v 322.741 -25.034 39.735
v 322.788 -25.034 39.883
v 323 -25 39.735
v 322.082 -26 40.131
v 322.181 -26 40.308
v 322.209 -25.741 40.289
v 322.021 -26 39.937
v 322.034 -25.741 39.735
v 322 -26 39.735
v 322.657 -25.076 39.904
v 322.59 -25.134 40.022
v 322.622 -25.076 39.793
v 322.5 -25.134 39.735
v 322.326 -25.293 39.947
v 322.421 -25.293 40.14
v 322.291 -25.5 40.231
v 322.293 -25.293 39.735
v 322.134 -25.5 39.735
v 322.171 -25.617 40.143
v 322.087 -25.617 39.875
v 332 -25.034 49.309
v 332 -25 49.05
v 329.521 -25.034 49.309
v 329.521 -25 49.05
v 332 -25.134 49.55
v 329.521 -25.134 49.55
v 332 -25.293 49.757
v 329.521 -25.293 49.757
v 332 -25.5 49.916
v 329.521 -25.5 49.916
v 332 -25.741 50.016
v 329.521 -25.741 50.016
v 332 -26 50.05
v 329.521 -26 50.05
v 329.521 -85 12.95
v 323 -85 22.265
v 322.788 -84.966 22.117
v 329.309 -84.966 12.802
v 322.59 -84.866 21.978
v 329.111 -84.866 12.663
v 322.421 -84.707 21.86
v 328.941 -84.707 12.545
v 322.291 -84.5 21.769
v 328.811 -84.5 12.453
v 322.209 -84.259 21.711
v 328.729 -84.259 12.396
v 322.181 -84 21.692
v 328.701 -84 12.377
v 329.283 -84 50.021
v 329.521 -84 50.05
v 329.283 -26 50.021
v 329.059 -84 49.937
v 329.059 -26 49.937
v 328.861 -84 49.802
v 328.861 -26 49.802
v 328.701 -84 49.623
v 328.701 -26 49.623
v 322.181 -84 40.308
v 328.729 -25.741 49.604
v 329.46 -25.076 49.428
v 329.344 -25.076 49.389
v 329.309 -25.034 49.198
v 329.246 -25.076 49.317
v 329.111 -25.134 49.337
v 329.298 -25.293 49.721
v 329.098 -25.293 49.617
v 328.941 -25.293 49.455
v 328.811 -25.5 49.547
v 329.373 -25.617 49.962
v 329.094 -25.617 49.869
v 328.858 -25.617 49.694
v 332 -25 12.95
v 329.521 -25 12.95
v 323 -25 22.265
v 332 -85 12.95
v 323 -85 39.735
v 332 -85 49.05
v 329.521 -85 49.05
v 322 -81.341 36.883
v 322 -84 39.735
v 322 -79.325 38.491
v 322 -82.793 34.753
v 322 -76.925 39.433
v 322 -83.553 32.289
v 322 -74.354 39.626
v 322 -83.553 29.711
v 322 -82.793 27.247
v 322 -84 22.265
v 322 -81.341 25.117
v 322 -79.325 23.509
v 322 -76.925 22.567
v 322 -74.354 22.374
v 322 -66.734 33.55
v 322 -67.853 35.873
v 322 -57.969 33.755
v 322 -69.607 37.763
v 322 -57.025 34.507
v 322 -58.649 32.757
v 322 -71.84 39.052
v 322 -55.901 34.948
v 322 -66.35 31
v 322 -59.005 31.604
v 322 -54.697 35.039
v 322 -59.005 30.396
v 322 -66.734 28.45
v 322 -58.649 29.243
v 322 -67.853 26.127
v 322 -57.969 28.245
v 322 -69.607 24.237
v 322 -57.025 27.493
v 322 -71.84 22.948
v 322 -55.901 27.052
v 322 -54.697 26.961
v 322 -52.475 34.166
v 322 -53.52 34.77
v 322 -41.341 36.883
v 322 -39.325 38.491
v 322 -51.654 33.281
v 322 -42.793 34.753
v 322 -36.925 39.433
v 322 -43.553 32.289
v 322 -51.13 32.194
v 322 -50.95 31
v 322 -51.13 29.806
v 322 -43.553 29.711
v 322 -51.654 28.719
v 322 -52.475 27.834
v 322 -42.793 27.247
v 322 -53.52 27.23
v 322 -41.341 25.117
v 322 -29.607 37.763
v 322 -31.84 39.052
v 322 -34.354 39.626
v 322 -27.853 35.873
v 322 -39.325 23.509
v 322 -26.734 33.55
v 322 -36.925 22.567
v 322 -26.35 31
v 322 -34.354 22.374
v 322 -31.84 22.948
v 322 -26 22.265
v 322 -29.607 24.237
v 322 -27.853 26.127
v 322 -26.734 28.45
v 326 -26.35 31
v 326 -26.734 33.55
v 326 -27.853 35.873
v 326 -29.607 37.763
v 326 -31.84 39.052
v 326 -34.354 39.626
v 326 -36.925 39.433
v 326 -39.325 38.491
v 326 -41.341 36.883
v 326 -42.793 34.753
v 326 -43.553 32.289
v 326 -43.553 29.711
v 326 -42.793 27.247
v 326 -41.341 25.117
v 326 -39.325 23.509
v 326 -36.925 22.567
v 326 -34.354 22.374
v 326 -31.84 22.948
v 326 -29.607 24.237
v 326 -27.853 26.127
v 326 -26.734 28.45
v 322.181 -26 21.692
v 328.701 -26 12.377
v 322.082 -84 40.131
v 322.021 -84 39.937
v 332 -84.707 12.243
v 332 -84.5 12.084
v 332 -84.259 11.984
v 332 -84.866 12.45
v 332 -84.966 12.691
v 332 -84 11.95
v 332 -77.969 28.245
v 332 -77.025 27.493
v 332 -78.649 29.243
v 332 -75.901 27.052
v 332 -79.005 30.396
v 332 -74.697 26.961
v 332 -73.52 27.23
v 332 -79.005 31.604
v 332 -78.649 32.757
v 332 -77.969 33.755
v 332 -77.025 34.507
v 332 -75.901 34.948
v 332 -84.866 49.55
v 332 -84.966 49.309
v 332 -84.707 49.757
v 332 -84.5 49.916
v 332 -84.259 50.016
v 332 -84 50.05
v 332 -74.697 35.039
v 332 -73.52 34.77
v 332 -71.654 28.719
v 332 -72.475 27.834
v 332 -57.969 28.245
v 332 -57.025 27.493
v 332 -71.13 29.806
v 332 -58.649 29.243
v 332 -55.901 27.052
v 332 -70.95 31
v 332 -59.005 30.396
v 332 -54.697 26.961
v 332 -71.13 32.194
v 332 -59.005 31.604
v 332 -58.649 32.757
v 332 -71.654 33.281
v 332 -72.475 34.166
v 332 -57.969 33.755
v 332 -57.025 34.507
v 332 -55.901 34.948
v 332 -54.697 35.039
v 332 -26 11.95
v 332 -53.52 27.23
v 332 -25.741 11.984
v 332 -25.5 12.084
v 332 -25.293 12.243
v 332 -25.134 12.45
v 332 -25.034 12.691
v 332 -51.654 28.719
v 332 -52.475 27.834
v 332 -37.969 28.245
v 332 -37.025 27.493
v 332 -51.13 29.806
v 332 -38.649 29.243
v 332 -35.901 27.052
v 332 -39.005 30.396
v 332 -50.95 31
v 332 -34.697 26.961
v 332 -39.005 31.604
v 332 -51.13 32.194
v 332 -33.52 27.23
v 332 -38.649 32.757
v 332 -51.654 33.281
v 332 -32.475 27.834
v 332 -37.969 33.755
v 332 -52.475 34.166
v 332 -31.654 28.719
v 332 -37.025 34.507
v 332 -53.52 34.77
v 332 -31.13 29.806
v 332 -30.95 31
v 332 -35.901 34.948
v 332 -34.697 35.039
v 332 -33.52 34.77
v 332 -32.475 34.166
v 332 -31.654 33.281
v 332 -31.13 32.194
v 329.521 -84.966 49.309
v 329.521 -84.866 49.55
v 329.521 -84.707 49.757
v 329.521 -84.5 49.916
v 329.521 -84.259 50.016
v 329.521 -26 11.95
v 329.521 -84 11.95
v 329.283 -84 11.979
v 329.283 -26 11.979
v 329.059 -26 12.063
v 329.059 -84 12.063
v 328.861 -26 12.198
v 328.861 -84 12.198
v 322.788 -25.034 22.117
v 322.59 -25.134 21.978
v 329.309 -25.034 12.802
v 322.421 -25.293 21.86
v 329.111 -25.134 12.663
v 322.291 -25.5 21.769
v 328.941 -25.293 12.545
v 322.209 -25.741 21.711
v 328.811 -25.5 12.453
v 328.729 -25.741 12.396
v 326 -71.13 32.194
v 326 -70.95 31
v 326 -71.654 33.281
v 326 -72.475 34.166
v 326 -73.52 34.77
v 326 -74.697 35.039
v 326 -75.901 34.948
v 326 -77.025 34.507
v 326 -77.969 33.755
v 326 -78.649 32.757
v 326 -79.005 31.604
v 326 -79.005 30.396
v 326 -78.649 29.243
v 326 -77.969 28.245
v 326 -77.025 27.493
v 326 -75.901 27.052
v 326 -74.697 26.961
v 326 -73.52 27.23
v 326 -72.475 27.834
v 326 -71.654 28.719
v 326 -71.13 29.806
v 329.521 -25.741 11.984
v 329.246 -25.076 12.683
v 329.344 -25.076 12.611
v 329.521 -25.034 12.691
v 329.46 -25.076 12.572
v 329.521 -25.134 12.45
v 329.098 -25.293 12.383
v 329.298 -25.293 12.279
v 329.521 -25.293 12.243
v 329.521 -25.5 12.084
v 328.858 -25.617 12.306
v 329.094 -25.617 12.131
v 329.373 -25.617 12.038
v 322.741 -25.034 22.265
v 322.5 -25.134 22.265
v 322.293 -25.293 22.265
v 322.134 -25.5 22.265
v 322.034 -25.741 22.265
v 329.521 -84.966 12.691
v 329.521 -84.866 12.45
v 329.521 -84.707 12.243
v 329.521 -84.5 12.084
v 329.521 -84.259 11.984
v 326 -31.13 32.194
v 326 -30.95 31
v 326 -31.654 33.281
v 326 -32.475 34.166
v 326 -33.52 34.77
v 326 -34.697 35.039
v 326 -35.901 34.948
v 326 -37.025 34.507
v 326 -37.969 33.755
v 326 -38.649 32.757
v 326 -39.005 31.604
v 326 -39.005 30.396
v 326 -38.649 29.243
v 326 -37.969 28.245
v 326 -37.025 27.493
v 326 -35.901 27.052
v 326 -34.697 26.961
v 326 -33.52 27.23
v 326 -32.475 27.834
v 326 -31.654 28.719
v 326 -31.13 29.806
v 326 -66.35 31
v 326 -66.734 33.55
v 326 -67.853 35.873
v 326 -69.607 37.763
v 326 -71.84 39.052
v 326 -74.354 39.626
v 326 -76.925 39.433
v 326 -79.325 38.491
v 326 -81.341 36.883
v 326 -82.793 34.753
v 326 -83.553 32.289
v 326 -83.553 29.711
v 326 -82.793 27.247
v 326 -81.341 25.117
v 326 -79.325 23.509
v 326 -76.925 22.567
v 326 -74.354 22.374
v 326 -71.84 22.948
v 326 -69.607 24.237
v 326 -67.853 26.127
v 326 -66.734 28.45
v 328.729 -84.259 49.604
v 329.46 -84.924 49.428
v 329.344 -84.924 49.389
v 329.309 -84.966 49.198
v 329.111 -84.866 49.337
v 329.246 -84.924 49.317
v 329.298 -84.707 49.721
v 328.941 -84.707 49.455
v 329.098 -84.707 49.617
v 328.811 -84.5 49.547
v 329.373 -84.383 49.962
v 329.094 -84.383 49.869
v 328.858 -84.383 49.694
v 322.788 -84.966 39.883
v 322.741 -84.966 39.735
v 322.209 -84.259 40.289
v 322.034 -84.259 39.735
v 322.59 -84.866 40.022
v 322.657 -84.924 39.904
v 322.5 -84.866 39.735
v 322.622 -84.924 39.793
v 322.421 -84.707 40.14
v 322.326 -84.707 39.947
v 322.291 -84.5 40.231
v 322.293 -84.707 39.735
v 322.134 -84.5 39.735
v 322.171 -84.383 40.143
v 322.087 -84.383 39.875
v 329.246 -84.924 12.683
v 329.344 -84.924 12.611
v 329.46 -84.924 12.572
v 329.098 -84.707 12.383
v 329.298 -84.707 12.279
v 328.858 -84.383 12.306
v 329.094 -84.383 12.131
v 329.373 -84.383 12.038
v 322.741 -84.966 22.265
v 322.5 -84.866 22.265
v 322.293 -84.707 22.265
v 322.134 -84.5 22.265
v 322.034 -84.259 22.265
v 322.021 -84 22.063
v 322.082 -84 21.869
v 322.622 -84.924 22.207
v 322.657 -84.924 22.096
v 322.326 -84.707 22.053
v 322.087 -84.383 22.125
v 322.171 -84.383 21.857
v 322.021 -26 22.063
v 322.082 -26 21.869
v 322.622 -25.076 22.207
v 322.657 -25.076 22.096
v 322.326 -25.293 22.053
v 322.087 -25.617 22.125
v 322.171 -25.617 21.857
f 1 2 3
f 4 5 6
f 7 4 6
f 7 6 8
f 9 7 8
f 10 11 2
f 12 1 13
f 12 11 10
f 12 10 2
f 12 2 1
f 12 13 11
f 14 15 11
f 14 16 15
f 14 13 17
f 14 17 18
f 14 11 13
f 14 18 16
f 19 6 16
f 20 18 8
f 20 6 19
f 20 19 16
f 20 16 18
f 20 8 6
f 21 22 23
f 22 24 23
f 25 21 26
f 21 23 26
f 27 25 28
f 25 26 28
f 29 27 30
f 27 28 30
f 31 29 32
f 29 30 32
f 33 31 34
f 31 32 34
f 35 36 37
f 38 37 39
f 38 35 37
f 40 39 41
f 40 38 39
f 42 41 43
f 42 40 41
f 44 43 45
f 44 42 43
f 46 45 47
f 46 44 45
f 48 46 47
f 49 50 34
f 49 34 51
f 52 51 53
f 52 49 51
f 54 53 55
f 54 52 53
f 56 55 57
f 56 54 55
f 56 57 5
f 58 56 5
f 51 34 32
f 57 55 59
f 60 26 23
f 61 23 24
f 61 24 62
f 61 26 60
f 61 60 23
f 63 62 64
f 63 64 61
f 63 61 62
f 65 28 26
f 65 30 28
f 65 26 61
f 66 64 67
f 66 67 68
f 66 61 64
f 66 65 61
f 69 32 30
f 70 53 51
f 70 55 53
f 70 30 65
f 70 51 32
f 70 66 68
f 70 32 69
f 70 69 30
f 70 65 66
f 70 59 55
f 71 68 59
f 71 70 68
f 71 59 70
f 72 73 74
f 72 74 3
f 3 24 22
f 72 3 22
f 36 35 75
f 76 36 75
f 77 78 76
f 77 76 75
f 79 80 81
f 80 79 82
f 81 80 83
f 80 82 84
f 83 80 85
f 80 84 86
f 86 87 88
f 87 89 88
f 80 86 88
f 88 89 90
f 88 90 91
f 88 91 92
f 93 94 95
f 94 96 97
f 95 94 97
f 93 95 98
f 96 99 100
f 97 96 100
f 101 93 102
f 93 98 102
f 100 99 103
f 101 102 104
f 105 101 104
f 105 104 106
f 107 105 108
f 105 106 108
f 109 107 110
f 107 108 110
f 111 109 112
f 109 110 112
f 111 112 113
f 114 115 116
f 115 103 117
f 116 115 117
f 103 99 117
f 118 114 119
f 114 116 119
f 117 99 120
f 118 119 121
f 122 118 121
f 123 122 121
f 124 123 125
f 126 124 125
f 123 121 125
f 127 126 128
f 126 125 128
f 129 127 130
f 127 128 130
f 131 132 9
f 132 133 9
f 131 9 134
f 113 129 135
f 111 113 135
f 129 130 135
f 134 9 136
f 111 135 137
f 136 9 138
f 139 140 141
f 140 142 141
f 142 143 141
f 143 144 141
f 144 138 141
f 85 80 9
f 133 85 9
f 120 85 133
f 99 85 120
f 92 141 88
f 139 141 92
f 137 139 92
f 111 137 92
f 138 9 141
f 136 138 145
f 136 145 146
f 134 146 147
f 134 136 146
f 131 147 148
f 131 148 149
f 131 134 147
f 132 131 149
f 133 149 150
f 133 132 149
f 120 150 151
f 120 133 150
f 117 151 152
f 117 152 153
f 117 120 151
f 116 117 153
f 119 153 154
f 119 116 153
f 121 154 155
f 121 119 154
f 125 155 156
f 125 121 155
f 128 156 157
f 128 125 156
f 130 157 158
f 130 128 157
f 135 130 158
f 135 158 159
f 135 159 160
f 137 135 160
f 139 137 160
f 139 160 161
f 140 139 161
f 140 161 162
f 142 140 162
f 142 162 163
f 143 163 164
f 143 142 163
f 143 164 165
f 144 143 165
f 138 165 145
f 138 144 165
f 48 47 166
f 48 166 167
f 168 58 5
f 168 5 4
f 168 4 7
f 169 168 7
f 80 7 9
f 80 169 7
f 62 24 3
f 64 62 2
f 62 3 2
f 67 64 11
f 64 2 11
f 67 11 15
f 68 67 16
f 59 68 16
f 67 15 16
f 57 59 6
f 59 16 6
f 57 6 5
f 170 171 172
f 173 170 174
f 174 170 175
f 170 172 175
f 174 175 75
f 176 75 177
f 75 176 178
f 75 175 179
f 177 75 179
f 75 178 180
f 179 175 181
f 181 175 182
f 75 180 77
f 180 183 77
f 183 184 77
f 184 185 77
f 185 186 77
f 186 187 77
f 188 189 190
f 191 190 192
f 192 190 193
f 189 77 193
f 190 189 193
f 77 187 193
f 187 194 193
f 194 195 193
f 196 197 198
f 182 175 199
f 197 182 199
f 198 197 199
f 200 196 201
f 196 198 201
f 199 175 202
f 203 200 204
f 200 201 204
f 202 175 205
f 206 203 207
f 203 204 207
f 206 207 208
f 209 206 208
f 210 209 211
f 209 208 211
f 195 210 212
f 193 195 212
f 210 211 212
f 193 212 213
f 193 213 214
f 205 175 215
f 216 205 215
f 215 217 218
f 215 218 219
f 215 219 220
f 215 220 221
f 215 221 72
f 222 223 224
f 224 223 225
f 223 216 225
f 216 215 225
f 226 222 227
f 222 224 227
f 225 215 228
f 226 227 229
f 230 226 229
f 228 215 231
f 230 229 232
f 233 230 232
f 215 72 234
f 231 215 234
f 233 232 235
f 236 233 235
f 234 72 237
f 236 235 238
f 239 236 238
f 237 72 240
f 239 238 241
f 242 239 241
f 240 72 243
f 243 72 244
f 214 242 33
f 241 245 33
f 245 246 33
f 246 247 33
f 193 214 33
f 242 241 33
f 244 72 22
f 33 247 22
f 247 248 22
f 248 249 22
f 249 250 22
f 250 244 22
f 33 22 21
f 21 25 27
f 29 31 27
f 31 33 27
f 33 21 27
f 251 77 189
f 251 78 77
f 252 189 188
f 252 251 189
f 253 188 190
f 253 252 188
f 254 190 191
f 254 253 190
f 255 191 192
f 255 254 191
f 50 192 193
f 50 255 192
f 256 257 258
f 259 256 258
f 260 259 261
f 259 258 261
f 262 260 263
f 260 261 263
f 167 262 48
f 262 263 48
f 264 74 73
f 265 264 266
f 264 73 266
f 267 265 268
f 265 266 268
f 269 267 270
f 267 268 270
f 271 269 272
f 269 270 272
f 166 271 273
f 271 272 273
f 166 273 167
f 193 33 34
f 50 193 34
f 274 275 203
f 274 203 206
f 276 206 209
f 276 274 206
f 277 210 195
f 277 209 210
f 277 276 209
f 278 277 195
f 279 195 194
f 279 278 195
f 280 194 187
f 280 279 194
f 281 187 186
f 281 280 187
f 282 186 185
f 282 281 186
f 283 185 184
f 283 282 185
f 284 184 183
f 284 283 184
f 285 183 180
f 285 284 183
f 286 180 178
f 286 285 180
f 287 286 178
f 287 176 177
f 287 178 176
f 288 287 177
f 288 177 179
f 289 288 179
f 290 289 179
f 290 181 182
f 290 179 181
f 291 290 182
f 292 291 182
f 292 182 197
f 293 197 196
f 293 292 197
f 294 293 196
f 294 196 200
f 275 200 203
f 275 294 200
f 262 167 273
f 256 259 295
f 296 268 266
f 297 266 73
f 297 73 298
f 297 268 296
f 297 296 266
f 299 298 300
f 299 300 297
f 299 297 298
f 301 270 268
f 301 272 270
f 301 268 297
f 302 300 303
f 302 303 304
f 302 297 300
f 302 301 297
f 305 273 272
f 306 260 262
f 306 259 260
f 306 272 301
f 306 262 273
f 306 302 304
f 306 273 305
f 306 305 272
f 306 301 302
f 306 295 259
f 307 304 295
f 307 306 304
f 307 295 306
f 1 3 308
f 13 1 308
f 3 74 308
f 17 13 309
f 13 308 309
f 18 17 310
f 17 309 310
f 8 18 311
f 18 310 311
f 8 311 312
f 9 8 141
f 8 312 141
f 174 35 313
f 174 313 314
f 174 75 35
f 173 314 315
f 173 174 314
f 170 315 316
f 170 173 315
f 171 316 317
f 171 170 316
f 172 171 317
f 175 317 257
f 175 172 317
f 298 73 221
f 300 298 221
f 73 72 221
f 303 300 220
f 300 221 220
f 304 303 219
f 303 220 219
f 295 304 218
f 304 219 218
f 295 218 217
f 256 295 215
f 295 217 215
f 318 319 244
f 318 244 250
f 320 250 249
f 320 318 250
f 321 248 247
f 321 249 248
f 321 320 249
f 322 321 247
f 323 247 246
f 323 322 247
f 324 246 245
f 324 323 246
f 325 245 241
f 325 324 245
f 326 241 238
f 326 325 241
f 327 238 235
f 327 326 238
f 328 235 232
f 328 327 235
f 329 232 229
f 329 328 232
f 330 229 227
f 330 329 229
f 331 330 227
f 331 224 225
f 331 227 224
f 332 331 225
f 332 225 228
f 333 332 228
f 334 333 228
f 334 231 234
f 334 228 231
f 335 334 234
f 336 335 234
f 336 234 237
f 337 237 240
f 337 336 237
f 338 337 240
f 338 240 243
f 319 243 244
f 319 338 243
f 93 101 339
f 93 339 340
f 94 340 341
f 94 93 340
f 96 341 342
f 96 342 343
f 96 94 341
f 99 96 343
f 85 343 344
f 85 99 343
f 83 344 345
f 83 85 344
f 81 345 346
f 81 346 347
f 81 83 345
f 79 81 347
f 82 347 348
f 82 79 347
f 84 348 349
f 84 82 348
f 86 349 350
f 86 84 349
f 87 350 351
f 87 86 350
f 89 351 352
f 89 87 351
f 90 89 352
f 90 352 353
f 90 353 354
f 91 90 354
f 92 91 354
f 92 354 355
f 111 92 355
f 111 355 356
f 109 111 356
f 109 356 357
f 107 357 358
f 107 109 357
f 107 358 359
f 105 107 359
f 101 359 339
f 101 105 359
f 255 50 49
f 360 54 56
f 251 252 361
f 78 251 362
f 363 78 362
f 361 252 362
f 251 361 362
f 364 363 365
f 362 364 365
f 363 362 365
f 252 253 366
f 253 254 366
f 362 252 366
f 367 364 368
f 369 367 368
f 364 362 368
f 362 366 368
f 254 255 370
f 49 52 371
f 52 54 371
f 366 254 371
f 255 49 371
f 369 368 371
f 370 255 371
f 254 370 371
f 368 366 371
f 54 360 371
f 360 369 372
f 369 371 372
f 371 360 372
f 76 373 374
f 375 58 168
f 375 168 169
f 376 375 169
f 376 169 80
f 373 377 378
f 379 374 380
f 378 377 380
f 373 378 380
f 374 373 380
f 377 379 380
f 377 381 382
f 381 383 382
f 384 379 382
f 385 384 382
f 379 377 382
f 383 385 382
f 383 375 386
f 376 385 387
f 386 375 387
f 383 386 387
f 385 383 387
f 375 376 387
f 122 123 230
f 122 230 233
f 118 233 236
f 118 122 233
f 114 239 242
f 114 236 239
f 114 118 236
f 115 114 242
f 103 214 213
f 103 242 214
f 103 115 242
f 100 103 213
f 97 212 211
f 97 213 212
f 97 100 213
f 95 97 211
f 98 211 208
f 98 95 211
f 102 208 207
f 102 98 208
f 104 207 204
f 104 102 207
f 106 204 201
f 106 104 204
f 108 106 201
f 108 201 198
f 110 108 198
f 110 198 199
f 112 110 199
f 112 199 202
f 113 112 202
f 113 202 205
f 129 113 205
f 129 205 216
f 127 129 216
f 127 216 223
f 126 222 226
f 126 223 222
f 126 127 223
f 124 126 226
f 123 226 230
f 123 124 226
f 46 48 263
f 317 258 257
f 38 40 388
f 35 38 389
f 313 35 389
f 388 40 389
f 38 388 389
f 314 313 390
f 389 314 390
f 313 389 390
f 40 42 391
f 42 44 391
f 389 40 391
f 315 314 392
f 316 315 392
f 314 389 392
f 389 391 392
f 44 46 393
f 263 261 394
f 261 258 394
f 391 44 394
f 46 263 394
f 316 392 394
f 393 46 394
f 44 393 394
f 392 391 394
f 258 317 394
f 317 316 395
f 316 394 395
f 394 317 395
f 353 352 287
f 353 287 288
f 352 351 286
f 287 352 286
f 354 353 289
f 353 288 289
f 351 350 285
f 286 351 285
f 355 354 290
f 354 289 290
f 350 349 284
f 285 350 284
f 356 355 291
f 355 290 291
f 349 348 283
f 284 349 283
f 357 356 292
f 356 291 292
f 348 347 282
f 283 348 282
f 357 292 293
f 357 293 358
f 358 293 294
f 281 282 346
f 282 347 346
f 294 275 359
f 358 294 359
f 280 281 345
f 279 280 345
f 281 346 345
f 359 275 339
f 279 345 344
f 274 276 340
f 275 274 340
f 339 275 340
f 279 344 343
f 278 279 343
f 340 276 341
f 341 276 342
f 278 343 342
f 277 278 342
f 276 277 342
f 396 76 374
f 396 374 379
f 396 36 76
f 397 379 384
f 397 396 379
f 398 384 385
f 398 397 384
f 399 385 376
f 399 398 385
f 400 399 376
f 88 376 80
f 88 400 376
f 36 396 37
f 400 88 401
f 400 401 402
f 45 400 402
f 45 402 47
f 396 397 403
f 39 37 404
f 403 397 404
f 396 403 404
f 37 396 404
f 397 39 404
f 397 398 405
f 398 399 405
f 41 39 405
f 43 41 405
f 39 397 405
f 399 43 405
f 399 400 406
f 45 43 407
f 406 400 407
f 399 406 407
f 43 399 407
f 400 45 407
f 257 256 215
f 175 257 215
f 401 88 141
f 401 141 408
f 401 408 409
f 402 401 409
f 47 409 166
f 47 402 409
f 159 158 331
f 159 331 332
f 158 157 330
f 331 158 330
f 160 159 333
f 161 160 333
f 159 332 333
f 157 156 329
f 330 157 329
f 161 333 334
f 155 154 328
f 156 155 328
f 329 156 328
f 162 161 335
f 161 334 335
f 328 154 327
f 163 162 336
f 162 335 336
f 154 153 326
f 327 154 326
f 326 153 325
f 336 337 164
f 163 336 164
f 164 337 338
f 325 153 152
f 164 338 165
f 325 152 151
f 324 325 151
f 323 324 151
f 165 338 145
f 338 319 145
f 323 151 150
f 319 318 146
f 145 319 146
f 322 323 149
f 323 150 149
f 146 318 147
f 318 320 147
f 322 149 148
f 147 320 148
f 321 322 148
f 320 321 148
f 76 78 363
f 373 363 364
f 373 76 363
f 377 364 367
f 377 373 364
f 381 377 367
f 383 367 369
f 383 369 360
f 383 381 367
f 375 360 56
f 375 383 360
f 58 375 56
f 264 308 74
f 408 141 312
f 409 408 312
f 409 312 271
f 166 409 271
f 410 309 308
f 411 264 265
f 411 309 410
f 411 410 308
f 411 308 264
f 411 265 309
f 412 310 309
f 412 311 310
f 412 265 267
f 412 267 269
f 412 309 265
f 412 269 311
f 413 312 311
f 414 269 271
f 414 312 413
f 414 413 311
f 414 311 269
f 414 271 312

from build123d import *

# Parameters (mm, degrees)
PAD003_DEPTH    = 60
SKETCH022_R     = 4.05
POCKET018_DEPTH = 332.001
SKETCH023_R     = 8.65
POCKET019_DEPTH = 4
SKETCH024_R     = 4.05
POCKET020_DEPTH = 332.001
FILLET006_R     = 1
FILLET007_R     = 1


with BuildPart() as part:
    # Sketch021 → Pad003 (new body)
    with BuildSketch(Plane.XZ.offset(25)):
        Polygon((332, 31), (332, 50.05), (329, 50.05), (322, 40.05), (322, 21.95), (329, 11.95), (332, 11.95), align=None)
    extrude(amount=PAD003_DEPTH)

    # Sketch022 → Pocket018 (cut, through all)
    with BuildSketch(Plane.YZ):
        with Locations((-75, 31)):
            Circle(SKETCH022_R)
        with Locations((-35, 31)):
            Circle(SKETCH022_R)
    extrude(amount=POCKET018_DEPTH, mode=Mode.SUBTRACT)

    # Sketch023 → Pocket019 (cut)
    with BuildSketch(Plane.YZ.offset(322)):
        with Locations((-75, 31)):
            Circle(SKETCH023_R)
        with Locations((-35, 31)):
            Circle(SKETCH023_R)
    extrude(amount=POCKET019_DEPTH, mode=Mode.SUBTRACT)

    # Sketch024 → Pocket020 (cut, through all)
    with BuildSketch(Plane.YZ):
        with Locations((-55, 31)):
            Circle(SKETCH024_R)
    extrude(amount=POCKET020_DEPTH, mode=Mode.SUBTRACT)

    # Fillet006
    fillet006_edges = [part.edges().sort_by_distance(p)[0] for p in [
        (329, -55, 11.95),
        (322, -55, 21.95),
        (322, -55, 40.05),
        (329, -55, 50.05),
    ]]
    fillet(fillet006_edges, radius=FILLET006_R)

    # Fillet007
    fillet007_edges = [part.edges().sort_by_distance(p)[0] for p in [
        (325.441096, -25, 44.965851),
        (322, -25, 31),
        (325.441096, -25, 17.034149),
        (325.441096, -85, 17.034149),
        (322, -85, 31),
        (325.441096, -85, 44.965851),
    ]]
    fillet(fillet007_edges, radius=FILLET007_R)


solid = part.part
